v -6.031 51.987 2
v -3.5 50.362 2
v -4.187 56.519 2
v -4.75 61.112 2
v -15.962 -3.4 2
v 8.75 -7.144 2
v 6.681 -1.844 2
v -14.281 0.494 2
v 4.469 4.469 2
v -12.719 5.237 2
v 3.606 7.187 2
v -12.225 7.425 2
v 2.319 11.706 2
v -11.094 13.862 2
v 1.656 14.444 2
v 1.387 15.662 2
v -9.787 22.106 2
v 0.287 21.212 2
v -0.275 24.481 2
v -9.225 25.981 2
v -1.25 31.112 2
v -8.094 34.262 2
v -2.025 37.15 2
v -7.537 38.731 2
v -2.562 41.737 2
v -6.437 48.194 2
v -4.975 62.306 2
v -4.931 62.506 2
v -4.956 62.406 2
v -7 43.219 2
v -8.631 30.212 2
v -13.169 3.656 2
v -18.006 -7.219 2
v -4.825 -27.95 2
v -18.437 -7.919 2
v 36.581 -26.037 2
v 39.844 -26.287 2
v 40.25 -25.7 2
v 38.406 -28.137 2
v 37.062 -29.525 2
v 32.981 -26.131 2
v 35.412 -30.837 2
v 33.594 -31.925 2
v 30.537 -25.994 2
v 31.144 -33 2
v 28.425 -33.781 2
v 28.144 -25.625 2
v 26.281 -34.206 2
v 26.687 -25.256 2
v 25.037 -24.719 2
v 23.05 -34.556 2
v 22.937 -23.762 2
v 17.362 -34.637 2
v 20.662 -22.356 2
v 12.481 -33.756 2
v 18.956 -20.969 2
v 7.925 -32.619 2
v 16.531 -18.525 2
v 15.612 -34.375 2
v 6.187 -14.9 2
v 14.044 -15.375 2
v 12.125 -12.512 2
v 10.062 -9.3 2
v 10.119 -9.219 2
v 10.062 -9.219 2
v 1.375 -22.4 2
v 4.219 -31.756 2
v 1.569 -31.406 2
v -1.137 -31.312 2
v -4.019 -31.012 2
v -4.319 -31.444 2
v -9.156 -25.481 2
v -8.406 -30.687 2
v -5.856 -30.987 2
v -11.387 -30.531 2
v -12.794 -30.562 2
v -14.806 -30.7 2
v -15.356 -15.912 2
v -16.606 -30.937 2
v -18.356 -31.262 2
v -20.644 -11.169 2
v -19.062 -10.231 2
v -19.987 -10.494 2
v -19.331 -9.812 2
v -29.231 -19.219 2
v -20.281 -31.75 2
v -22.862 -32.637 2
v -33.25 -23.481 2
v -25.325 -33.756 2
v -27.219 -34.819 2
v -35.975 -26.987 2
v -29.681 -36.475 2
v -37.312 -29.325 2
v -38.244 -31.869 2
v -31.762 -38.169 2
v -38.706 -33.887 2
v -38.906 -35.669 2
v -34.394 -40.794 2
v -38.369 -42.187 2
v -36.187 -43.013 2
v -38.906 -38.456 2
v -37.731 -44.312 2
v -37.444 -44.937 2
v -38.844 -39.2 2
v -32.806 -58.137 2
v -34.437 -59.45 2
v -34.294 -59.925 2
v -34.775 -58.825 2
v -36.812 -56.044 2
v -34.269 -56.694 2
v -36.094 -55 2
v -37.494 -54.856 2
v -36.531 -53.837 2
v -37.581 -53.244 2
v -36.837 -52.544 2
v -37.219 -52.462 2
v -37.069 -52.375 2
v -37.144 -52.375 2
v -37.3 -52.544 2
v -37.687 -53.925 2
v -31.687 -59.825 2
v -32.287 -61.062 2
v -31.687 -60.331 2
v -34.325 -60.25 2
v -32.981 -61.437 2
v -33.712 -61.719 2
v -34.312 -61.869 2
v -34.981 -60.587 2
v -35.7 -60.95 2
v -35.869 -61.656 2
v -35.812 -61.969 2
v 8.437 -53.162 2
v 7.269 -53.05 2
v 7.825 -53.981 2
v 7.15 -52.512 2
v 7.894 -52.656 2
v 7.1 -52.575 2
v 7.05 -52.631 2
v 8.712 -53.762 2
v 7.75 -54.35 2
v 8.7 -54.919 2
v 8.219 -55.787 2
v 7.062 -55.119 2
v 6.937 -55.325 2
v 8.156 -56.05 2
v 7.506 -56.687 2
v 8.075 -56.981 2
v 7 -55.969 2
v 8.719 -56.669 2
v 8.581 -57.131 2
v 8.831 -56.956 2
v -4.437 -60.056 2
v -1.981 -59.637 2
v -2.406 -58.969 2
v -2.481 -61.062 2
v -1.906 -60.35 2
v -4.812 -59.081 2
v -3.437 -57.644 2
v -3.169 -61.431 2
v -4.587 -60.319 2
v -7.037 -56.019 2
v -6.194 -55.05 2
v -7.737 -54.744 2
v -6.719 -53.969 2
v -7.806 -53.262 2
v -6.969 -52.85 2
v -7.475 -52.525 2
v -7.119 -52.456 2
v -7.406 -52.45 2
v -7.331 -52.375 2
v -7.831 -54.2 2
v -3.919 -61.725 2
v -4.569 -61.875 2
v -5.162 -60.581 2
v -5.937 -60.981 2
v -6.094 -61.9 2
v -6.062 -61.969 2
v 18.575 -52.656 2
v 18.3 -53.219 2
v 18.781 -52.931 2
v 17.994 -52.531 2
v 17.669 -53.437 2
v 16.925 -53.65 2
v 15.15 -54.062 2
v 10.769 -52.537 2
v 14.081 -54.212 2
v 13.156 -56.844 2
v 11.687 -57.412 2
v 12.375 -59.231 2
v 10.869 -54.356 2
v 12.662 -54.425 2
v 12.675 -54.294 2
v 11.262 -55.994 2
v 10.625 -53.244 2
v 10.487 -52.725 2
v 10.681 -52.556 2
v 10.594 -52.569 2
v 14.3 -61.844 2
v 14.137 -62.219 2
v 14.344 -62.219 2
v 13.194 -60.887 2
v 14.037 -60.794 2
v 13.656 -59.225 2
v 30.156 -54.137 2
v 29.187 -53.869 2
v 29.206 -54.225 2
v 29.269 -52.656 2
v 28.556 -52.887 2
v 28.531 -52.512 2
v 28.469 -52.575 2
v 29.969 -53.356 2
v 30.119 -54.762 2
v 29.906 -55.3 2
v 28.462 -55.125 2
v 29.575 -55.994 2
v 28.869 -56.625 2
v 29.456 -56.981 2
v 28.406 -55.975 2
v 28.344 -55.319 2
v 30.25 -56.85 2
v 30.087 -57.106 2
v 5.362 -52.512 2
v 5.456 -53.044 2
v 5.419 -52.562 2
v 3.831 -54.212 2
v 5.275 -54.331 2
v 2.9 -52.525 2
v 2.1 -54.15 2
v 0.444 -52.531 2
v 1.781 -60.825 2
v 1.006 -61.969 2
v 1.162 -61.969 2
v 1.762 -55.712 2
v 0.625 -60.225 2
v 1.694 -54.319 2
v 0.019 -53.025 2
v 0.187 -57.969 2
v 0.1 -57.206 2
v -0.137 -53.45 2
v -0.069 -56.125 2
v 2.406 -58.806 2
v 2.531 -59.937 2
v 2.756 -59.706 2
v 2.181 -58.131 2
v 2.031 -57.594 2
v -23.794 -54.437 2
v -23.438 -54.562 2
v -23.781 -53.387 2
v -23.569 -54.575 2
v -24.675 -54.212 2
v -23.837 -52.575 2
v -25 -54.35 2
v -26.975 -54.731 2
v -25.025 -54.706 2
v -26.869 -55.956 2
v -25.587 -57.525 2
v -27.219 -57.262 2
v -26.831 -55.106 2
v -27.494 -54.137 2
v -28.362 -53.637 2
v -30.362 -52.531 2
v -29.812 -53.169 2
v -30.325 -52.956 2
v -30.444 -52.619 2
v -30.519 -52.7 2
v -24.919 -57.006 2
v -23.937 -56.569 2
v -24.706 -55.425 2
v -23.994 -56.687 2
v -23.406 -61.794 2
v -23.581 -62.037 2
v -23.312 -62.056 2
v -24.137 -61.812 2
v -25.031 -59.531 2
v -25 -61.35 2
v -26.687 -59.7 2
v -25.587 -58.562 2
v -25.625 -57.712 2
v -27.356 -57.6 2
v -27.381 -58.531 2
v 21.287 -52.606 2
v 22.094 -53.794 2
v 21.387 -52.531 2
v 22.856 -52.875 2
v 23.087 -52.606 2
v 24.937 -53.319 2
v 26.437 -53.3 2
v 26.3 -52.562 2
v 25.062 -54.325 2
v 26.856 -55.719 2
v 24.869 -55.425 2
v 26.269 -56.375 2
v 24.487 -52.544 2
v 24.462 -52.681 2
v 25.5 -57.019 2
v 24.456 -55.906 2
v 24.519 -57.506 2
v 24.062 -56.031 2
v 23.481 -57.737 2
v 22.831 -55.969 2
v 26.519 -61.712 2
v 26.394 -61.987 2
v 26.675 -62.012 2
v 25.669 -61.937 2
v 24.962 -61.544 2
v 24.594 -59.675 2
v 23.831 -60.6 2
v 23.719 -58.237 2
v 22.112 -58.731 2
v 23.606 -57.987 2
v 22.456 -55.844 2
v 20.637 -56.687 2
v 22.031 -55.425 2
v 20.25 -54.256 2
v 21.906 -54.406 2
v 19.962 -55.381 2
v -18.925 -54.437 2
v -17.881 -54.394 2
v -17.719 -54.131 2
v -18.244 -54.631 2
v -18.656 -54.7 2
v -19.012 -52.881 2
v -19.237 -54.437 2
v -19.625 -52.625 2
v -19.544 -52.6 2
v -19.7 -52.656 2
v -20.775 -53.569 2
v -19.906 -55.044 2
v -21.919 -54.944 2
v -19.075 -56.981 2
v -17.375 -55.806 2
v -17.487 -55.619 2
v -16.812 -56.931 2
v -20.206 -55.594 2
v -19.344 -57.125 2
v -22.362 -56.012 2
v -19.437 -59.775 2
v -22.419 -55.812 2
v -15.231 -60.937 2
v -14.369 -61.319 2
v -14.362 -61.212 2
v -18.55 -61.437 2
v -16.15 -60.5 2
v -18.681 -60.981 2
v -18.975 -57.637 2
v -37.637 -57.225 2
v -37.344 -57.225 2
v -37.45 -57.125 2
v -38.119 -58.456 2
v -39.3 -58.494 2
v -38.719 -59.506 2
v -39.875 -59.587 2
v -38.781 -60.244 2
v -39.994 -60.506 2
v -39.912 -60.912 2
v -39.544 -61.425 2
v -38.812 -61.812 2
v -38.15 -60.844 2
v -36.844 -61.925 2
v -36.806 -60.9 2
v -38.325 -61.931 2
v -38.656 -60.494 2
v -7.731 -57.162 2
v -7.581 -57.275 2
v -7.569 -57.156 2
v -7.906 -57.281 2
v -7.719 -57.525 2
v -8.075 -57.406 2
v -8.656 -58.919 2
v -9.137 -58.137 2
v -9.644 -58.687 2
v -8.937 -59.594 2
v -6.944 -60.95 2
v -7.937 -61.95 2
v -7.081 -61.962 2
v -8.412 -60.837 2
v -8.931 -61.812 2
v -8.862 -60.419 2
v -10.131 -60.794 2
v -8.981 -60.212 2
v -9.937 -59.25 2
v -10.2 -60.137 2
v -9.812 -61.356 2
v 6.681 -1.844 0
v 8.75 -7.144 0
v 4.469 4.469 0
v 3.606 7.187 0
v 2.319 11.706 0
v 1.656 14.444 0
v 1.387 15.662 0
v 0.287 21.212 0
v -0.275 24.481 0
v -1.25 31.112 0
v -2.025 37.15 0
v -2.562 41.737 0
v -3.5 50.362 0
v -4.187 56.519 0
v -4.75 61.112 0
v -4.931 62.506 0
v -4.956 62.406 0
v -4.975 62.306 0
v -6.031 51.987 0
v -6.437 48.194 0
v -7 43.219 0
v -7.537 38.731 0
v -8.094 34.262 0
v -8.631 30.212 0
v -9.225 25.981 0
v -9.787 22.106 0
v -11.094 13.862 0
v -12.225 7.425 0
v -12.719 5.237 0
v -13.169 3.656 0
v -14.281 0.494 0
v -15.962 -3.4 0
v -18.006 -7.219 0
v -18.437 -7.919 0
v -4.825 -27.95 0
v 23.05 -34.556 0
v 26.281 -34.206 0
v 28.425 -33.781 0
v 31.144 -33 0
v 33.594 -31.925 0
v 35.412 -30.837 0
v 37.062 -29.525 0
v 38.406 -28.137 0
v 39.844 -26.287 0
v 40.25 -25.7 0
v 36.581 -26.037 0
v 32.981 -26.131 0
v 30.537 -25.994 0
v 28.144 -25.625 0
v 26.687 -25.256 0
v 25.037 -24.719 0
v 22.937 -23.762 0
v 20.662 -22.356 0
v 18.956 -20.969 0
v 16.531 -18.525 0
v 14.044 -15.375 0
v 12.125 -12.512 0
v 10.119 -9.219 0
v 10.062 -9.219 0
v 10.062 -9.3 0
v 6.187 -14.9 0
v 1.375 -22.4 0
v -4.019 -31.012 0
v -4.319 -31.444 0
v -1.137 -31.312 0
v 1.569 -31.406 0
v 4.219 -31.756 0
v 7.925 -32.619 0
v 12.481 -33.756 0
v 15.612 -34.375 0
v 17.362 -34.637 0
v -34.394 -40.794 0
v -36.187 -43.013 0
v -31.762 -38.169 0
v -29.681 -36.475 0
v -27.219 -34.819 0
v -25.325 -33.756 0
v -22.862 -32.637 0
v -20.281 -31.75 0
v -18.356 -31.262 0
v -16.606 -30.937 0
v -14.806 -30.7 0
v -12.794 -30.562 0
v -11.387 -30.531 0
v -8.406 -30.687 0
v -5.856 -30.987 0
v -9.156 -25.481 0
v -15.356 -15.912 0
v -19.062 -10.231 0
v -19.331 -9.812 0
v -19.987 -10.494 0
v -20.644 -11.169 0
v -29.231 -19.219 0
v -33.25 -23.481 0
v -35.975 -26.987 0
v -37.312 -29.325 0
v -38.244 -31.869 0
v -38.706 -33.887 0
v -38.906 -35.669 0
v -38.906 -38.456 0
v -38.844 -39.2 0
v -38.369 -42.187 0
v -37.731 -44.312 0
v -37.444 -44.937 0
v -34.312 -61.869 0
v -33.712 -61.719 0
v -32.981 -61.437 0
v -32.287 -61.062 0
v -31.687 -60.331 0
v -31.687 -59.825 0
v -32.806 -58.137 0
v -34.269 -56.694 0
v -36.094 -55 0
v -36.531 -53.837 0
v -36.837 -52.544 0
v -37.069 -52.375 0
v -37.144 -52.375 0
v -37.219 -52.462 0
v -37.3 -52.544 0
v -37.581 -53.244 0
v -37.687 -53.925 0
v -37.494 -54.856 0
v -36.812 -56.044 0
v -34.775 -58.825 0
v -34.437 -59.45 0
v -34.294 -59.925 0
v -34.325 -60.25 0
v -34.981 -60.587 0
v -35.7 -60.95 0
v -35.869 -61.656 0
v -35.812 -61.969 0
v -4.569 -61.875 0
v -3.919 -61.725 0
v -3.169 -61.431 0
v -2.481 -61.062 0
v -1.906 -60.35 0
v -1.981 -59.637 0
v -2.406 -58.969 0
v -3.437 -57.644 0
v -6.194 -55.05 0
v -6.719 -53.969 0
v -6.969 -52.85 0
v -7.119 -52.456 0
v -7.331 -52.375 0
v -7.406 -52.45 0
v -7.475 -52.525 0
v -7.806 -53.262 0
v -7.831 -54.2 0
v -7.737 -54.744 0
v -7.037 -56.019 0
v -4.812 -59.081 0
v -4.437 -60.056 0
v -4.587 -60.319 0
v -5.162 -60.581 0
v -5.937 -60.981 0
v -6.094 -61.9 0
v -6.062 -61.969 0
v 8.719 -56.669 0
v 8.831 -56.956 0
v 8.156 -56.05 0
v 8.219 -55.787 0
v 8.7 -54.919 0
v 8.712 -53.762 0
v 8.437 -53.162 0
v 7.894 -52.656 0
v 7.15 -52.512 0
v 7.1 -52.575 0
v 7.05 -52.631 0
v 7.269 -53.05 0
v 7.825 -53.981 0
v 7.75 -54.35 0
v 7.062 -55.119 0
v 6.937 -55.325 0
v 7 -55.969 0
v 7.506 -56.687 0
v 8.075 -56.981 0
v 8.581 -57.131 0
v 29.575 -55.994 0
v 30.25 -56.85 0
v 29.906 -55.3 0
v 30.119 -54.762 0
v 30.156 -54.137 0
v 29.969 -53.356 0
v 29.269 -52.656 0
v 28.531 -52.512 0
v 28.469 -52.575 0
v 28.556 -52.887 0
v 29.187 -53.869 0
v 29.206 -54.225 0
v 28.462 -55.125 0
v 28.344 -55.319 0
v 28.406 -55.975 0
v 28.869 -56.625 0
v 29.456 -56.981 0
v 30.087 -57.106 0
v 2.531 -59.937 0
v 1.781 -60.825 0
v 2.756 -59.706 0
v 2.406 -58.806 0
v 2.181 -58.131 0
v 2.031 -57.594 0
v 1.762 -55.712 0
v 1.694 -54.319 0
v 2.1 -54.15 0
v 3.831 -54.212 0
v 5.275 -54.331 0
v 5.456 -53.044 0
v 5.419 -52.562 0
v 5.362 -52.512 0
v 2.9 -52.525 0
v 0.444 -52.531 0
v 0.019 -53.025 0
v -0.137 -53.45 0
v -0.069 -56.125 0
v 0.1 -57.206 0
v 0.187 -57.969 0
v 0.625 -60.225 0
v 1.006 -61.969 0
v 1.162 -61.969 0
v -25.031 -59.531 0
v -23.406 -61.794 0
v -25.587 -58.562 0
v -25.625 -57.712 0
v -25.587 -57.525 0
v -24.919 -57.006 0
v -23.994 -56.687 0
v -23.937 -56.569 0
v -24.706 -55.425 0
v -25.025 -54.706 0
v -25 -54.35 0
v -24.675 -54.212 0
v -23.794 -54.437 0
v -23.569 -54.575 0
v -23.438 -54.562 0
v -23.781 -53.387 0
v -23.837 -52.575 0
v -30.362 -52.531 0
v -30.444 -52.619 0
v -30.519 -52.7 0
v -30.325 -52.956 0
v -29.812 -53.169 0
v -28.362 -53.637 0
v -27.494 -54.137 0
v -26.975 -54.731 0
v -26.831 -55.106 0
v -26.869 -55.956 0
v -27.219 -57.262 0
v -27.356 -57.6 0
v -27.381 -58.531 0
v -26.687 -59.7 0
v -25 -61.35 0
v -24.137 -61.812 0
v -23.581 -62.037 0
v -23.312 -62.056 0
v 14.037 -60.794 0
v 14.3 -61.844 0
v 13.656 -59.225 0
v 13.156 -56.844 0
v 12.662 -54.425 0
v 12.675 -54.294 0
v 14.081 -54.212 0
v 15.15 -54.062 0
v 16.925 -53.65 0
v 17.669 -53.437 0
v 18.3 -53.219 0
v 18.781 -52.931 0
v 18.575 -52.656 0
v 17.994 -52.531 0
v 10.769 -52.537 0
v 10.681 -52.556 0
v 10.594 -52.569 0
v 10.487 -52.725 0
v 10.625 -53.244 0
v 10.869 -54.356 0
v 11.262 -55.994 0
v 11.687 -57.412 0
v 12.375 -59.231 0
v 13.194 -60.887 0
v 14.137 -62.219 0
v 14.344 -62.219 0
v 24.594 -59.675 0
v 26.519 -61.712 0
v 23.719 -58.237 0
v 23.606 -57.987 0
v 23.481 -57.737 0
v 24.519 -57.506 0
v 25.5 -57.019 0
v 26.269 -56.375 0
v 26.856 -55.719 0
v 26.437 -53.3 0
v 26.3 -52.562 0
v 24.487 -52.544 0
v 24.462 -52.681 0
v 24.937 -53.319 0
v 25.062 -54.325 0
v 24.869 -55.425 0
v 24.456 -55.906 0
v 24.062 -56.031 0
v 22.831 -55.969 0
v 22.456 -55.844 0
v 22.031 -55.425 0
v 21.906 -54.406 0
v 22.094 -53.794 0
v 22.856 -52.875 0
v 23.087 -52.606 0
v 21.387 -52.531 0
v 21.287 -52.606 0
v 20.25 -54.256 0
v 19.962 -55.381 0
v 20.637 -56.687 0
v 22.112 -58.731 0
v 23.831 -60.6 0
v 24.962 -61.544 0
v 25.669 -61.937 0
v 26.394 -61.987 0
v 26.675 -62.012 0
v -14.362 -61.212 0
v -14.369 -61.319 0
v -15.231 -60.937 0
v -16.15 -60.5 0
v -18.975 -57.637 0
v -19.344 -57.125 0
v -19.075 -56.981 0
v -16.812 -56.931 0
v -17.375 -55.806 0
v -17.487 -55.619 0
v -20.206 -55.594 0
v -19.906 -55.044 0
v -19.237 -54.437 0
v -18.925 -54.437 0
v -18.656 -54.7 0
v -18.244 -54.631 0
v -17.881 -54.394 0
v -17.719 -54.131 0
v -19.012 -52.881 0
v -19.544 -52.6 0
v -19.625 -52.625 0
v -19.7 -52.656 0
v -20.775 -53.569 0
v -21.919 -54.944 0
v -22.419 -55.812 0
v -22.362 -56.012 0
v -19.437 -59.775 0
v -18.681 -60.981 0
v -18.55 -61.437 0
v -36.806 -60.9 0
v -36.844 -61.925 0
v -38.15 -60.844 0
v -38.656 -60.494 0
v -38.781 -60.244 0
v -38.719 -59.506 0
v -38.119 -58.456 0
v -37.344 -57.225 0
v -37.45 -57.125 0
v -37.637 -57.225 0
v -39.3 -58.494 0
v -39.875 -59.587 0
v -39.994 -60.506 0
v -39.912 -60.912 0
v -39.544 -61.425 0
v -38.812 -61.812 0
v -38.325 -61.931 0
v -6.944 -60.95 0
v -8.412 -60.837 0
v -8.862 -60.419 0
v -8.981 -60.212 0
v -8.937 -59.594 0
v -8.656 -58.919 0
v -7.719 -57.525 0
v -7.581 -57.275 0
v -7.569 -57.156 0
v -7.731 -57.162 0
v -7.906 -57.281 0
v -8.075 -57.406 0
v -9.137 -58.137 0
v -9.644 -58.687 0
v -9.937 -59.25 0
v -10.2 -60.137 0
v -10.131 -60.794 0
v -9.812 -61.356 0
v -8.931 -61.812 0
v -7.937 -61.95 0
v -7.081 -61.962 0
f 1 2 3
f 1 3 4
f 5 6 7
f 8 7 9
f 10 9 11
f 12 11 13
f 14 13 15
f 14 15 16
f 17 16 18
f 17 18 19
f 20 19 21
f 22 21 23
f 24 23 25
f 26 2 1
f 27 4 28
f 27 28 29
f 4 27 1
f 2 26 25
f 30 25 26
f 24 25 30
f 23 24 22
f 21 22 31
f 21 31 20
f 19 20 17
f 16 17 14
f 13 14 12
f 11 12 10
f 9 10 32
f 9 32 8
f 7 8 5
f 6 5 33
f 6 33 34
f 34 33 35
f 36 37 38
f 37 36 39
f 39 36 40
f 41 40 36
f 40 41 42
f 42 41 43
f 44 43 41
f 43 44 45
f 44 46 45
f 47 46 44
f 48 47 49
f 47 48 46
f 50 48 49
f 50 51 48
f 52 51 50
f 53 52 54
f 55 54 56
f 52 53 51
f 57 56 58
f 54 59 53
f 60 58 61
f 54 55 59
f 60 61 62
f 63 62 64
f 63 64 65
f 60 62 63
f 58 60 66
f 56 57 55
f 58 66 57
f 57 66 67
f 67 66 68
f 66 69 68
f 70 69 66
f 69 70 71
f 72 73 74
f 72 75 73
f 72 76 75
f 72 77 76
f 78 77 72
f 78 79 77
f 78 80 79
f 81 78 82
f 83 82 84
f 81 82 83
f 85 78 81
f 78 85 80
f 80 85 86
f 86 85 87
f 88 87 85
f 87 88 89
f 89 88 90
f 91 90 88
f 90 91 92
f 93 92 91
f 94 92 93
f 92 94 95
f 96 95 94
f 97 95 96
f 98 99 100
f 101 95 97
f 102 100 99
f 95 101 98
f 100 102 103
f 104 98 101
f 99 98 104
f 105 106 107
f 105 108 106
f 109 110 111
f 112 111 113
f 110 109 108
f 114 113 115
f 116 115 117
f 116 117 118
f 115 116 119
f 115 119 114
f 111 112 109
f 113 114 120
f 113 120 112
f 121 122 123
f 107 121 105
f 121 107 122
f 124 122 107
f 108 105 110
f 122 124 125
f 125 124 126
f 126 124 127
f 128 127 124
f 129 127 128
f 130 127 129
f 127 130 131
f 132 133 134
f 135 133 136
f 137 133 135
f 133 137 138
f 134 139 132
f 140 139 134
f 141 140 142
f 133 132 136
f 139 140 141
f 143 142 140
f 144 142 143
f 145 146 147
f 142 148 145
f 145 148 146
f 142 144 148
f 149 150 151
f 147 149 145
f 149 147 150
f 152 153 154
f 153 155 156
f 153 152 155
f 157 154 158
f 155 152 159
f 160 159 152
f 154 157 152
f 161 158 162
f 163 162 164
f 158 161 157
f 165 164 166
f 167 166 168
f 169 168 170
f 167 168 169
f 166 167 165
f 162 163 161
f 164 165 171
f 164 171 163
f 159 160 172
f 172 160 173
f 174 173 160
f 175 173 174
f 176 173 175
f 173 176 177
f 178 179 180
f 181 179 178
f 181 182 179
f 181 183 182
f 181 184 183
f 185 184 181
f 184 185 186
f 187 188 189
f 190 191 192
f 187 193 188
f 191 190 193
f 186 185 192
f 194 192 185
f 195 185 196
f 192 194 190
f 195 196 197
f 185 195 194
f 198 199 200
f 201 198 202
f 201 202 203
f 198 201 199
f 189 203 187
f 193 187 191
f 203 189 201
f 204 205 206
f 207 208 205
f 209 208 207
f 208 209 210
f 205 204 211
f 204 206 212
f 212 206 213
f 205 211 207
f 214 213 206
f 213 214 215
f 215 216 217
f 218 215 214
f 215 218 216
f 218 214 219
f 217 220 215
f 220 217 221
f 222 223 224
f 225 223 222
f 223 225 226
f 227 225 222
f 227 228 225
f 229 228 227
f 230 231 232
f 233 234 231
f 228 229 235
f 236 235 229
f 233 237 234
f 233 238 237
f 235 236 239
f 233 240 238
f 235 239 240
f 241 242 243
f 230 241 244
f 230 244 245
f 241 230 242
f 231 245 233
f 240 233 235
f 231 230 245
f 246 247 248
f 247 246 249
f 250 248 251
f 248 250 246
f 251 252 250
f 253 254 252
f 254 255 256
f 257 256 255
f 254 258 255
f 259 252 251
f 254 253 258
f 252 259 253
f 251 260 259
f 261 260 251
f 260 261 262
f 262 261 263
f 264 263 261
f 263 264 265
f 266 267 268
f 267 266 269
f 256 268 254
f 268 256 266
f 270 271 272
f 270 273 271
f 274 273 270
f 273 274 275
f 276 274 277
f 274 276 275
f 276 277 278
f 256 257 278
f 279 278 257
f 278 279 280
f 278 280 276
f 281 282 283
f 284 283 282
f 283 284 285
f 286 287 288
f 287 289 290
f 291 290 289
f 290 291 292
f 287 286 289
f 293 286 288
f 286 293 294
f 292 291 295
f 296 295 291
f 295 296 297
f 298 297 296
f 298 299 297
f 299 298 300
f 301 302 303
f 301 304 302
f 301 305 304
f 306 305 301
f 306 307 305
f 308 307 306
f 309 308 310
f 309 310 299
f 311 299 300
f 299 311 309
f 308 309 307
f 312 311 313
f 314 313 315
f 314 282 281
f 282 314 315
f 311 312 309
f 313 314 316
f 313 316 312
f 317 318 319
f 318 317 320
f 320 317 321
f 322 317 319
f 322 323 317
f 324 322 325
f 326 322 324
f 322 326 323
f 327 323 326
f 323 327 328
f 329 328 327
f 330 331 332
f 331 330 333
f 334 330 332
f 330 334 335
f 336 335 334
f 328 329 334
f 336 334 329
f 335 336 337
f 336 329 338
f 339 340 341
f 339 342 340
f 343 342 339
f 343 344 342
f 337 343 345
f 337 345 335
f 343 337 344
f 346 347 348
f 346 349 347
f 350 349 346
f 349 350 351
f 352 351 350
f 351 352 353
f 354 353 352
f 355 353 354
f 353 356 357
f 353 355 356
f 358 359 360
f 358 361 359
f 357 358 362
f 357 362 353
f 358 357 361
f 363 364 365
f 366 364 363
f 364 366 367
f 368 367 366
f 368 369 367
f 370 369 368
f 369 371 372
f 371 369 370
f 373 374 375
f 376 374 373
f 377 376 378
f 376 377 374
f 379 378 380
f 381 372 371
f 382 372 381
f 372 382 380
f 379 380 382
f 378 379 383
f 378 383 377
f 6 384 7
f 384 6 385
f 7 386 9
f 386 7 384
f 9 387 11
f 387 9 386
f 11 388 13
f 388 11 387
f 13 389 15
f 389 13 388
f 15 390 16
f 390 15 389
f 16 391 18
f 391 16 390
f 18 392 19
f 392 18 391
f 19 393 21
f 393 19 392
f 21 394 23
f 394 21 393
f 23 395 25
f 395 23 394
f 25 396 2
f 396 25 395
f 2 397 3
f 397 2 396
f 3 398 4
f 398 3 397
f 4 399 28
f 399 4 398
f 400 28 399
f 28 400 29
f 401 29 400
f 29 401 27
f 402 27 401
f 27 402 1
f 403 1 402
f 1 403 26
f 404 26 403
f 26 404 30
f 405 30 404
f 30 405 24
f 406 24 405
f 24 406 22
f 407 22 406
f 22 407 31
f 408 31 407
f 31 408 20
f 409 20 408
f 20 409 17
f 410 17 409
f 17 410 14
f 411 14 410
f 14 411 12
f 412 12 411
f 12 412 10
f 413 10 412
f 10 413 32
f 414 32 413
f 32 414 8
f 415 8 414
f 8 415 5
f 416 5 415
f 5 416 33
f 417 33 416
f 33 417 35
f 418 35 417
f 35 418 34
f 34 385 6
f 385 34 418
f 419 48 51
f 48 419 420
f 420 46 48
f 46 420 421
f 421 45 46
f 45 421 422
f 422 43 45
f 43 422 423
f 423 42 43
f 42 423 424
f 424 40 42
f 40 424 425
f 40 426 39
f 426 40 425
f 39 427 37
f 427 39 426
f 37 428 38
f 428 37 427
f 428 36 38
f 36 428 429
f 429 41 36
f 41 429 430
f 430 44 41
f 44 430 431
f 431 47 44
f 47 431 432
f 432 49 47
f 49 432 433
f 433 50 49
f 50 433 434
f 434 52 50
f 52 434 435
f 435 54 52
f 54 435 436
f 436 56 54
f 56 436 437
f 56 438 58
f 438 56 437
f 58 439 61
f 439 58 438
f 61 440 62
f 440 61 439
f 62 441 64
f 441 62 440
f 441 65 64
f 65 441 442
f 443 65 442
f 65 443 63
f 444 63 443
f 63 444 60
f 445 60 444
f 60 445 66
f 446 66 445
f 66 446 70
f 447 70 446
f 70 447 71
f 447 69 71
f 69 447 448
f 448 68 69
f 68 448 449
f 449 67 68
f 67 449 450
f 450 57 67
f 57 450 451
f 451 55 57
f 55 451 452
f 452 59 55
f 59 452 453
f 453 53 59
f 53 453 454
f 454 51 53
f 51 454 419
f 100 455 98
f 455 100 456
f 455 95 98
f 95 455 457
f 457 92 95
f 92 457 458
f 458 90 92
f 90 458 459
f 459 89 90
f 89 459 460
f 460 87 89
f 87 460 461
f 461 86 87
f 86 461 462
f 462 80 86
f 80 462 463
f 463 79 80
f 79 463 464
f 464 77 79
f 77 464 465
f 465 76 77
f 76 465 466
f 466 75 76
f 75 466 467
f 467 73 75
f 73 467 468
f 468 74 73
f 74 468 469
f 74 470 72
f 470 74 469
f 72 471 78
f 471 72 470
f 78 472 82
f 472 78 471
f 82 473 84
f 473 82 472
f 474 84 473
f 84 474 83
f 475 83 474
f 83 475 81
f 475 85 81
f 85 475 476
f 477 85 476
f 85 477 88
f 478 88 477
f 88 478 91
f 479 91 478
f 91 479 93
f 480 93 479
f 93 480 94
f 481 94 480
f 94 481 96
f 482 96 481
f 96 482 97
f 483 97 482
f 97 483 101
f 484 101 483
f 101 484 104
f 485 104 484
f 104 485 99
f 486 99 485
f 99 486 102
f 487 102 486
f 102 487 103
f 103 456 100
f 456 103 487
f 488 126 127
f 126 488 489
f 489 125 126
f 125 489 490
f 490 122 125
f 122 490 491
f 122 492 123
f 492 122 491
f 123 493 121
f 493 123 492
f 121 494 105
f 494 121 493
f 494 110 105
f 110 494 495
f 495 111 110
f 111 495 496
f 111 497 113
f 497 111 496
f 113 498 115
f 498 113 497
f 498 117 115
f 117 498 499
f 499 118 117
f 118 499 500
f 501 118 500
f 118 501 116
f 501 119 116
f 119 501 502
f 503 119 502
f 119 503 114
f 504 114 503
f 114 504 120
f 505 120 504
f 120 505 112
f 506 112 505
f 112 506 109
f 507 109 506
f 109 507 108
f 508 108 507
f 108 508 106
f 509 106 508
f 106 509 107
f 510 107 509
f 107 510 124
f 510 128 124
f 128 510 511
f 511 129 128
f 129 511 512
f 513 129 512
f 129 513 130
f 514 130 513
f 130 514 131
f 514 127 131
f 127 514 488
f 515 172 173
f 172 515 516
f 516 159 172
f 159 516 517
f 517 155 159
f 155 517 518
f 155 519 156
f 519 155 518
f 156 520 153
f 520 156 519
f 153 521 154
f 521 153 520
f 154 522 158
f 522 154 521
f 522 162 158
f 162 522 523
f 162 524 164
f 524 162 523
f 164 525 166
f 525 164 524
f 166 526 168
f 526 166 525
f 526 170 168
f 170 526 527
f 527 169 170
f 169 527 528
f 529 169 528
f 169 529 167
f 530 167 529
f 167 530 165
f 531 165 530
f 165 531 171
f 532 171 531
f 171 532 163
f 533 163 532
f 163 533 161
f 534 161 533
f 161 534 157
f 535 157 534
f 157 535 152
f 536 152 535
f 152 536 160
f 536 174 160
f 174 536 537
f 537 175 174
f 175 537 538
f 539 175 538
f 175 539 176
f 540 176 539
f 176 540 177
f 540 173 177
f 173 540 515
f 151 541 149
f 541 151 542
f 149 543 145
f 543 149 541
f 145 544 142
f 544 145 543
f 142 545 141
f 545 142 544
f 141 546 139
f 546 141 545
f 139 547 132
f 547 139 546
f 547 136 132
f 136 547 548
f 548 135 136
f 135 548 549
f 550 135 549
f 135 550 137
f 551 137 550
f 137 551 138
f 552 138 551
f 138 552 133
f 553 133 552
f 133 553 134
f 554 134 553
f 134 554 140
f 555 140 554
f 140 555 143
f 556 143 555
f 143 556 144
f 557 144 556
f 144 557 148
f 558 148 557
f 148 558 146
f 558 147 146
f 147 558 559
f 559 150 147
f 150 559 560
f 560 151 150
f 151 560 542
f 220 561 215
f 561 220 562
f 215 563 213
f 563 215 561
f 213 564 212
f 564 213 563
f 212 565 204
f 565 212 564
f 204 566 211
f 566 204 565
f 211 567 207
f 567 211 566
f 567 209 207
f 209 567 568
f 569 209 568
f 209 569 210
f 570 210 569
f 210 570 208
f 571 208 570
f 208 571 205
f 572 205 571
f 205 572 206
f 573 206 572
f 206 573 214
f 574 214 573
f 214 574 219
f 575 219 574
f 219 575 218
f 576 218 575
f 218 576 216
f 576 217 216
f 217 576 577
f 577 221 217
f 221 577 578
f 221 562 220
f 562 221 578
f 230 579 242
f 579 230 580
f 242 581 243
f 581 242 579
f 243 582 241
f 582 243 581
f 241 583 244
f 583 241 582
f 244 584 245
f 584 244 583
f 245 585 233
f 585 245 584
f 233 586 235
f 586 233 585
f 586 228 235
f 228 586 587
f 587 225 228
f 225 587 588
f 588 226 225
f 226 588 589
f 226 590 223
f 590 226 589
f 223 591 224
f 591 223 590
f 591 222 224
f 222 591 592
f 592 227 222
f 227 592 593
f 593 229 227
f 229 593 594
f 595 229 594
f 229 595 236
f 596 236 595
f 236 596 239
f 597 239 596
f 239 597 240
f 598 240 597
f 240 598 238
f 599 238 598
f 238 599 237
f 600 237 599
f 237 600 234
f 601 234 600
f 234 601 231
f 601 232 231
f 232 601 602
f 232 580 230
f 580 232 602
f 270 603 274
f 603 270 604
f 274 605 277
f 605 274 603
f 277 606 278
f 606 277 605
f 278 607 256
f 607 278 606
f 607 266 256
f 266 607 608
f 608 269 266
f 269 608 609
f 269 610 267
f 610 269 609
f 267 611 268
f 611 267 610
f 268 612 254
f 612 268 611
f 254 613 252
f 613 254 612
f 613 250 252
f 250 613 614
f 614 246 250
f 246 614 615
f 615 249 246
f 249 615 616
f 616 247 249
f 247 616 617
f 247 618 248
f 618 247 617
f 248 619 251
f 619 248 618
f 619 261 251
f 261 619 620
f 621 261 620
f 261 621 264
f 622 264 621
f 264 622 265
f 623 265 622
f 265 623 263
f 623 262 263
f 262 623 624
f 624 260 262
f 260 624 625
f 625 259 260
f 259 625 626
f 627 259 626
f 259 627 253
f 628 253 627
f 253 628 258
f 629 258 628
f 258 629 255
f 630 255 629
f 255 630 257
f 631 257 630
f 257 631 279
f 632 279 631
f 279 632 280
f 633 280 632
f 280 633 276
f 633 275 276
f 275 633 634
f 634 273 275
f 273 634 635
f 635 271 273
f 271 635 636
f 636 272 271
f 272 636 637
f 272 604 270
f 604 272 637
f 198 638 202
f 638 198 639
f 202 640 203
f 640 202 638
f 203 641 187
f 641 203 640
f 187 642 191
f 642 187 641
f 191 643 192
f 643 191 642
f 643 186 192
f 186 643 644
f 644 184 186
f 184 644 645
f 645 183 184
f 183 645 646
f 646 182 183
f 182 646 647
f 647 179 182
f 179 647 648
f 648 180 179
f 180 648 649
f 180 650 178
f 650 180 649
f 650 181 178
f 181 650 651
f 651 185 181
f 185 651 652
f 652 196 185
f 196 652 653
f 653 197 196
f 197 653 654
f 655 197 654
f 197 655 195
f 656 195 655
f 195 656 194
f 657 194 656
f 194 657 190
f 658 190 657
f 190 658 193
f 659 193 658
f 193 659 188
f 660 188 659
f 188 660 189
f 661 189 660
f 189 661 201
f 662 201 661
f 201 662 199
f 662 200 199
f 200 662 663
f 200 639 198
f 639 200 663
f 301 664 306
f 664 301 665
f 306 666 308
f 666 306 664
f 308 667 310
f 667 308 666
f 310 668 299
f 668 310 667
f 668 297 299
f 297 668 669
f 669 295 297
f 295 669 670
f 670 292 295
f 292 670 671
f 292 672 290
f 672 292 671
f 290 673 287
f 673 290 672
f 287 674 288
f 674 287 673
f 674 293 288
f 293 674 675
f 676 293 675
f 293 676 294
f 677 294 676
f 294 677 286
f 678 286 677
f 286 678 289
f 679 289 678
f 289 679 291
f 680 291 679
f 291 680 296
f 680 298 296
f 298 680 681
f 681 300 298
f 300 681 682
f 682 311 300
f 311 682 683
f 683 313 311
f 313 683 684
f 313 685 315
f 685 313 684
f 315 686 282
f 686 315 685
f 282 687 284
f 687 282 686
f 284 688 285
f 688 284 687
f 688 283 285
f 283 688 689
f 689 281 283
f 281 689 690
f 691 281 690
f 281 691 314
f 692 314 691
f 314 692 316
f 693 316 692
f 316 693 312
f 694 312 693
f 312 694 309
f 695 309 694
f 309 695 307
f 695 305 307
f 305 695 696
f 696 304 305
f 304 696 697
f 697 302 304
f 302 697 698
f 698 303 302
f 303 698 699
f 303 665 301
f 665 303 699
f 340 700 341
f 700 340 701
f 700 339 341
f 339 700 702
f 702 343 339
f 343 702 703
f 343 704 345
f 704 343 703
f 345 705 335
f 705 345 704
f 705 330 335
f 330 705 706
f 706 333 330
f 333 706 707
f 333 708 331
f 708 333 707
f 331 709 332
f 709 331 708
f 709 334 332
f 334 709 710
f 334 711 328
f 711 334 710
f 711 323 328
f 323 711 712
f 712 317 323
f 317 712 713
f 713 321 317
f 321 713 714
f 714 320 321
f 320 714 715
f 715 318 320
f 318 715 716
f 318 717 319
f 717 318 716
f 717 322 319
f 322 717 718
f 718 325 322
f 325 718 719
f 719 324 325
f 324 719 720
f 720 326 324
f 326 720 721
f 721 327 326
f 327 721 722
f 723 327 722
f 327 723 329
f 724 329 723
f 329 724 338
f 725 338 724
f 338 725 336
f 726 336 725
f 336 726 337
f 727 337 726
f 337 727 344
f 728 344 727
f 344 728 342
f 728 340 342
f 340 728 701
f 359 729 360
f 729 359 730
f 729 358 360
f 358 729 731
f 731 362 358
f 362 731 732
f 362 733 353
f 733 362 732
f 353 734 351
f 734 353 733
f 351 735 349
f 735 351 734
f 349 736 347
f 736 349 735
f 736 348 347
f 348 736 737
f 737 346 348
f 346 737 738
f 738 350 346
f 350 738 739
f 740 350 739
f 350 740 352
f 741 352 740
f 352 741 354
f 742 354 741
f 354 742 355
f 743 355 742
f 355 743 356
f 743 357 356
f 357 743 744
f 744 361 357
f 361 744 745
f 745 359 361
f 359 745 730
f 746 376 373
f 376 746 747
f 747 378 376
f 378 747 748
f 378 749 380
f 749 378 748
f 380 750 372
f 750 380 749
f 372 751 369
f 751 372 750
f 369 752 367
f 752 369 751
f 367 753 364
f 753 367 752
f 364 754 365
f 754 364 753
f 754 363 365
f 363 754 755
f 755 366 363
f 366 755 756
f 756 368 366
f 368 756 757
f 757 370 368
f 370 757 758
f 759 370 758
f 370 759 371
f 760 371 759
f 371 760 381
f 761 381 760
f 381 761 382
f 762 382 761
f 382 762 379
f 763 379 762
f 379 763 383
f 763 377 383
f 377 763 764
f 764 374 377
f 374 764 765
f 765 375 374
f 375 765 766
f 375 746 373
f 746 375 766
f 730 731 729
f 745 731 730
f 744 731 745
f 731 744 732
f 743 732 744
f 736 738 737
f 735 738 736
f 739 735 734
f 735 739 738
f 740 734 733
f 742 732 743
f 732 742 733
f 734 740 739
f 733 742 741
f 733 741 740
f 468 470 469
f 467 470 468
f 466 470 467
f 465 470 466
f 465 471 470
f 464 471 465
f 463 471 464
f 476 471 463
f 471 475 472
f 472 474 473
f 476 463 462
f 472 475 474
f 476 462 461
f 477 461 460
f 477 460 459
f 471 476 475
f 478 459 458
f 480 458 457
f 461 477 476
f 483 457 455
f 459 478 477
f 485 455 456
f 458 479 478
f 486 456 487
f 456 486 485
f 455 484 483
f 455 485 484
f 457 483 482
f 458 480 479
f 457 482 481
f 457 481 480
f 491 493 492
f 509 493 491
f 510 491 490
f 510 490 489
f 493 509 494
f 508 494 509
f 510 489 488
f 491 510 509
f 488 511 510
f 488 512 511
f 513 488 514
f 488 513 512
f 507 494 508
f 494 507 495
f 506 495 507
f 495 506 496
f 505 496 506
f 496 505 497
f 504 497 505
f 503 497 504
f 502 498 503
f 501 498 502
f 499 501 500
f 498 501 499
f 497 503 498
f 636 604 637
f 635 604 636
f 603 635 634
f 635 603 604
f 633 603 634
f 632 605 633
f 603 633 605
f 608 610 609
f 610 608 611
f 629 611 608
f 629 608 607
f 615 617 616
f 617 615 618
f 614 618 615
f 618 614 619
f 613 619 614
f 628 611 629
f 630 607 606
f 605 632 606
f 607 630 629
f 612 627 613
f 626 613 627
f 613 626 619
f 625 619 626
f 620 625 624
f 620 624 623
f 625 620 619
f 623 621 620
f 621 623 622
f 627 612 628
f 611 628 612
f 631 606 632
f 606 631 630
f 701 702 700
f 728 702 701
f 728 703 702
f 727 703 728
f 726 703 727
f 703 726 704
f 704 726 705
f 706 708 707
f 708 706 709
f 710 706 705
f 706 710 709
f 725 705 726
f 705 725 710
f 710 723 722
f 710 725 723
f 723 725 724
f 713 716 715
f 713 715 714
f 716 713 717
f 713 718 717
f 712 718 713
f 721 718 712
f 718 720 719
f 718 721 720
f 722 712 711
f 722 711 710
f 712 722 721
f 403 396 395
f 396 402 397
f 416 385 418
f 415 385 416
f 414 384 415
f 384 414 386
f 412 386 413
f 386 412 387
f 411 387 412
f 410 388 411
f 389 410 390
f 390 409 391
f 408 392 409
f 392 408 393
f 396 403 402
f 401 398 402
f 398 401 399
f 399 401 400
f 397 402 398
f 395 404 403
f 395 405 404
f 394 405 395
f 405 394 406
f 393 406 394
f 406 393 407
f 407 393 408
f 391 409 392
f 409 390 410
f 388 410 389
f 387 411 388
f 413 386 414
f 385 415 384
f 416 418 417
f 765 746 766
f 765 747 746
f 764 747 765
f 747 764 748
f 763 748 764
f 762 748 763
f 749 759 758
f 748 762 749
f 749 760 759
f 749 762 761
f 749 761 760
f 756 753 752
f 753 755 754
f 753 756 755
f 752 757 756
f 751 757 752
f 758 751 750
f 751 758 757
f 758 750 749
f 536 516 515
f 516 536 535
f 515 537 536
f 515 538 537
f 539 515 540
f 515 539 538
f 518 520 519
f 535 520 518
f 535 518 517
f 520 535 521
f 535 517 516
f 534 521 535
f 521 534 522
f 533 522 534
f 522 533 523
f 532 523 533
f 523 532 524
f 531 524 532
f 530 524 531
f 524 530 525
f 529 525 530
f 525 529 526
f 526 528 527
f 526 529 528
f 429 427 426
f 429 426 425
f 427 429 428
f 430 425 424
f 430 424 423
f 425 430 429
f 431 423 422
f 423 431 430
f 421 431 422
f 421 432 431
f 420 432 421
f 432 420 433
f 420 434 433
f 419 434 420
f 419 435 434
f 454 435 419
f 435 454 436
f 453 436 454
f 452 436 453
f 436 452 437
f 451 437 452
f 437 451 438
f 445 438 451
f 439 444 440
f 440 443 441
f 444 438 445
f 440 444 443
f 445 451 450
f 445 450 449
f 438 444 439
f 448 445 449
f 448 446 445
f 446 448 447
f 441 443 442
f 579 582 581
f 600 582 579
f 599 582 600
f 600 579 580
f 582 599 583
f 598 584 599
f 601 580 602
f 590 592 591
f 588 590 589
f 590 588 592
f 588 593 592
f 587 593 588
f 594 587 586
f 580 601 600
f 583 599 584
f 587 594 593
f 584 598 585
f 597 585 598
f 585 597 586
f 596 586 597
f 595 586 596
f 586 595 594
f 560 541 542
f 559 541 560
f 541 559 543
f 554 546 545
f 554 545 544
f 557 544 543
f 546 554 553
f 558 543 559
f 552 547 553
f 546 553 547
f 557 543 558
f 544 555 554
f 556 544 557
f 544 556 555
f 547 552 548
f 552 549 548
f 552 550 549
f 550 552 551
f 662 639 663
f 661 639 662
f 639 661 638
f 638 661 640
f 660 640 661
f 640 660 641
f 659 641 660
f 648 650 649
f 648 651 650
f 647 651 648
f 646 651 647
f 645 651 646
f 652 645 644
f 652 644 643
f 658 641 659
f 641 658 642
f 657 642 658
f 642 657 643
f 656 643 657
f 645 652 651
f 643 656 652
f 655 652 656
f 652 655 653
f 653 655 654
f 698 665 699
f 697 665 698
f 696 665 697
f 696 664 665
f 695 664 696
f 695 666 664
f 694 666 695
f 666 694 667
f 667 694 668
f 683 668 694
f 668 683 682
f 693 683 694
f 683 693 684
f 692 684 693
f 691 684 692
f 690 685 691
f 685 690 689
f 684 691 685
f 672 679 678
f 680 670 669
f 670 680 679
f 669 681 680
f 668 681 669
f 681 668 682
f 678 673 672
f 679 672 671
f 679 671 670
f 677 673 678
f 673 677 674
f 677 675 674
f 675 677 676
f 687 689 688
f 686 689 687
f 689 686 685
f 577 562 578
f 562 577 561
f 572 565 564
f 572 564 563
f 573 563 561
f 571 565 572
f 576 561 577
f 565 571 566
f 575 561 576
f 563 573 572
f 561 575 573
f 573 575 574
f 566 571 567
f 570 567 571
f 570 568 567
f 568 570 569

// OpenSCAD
module 74d9130690c415567329cd0a4fc02403_1()
{
 /* Generated by trace2scad version 20150415
    http://aggregate.org/MAKE/TRACE2SCAD/
    Optimized model has 387/4796 original points
 */
 color([0.48, 0.48, 0.48])
 assign(minx=0) /* polygon minx=39 */
 assign(miny=0) /* polygon miny=45 */
 assign(maxx=12880) /* polygon maxx=12880 */
 assign(maxy=20000) /* polygon maxy=20001 */
 assign(dx=maxx-minx)
 assign(dy=maxy-miny)
 assign(maxd=((dx>dy)?dx:dy))
 scale([1/maxd, 1/maxd, 1])
 translate([-minx-dx/2, -miny-dy/2, 0])
 linear_extrude(height=1, convexity=387)
 union() {
  union() {
   polygon([[5647,19985],[5644,19969],[5475,18318],[5410,17711],[5320,16915],[5234,16197],[5145,15482],[5059,14834],[4964,14157],[4874,13537],[4665,12218],[4484,11188],[4405,10838],[4333,10585],[4155,10079],[3886,9456],[3559,8845],[3490,8733],[5668,5528],[7840,8857],[7509,9705],[7155,10715],[7017,11150],[6811,11873],[6705,12311],[6662,12506],[6486,13394],[6396,13917],[6240,14978],[6116,15944],[6030,16678],[5880,18058],[5770,19043],[5680,19778],[5651,20001]], convexity=6);
   polygon([[8050,8518],[8050,8512],[7430,7616],[6660,6416],[5797,5038],[5749,4969],[6258,4990],[6691,4975],[7115,4919],[7708,4781],[8437,4599],[8938,4500],[9218,4458],[10128,4471],[10645,4527],[10988,4595],[11423,4720],[11815,4892],[12106,5066],[12370,5276],[12585,5498],[12815,5794],[12880,5888],[12293,5834],[11717,5819],[11326,5841],[10943,5900],[10710,5959],[10446,6045],[10110,6198],[9746,6423],[9473,6645],[9085,7036],[8687,7540],[8380,7998],[8059,8525],[8050,8525]], convexity=9);
   polygon([[3242,8321],[3137,8213],[1763,6925],[1120,6243],[684,5682],[470,5308],[321,4901],[247,4578],[215,4293],[215,3847],[225,3728],[301,3250],[403,2910],[449,2810],[650,3118],[937,3473],[1358,3893],[1691,4164],[2085,4429],[2388,4599],[2782,4778],[3195,4920],[3503,4998],[3783,5050],[4071,5088],[4393,5110],[4618,5115],[5095,5090],[5503,5042],[4975,5923],[3983,7454],[3390,8363],[3347,8430]], convexity=7);
   polygon([[485,1606],[472,1593],[427,1481],[410,1372],[441,1223],[550,1033],[876,588],[930,488],[953,412],[948,360],[843,306],[728,248],[701,135],[710,85],[950,101],[1046,125],[1163,170],[1274,230],[1370,347],[1370,428],[1191,698],[957,929],[665,1200],[595,1386],[546,1593],[509,1620],[497,1620]], convexity=8);
   polygon([[5255,1608],[5244,1596],[5191,1478],[5187,1328],[5202,1241],[5314,1037],[5670,547],[5730,391],[5706,349],[5614,307],[5490,243],[5465,96],[5470,85],[5709,100],[5813,124],[5933,171],[6043,230],[6135,344],[6123,458],[6055,565],[5890,777],[5449,1192],[5365,1365],[5325,1544],[5301,1607],[5267,1620]], convexity=8);
   polygon([[6904,1596],[6511,1595],[6443,1516],[6418,1448],[6429,1020],[6456,847],[6470,725],[6540,364],[6601,85],[6626,85],[6725,268],[6845,410],[6881,447],[6825,591],[6789,699],[6765,785],[6722,1086],[6711,1309],[6776,1336],[7053,1326],[7284,1307],[7313,1513],[7307,1590],[7298,1598]], convexity=10);
   polygon([[7576,1588],[7568,1579],[7603,1512],[7692,1363],[7680,1304],[7570,1181],[7550,1148],[7560,1045],[7641,930],[7732,883],[7813,859],[7853,887],[7835,933],[7745,1032],[7755,1074],[7832,1213],[7834,1398],[7790,1494],[7703,1575],[7584,1598]], convexity=10);
   polygon([[11000,1593],[10995,1588],[11009,1538],[11110,1381],[11113,1324],[10994,1180],[10975,1149],[10985,1044],[11059,940],[11153,883],[11254,863],[11280,904],[11172,1041],[11225,1152],[11259,1238],[11265,1338],[11235,1463],[11123,1575],[11005,1598]], convexity=10);
   polygon([[1569,1581],[1557,1568],[1588,1527],[1670,1493],[1902,1418],[2041,1338],[2124,1243],[2147,1183],[2141,1047],[2085,838],[2063,784],[2059,635],[2170,448],[2440,184],[2578,110],[2667,74],[2710,71],[2695,113],[2435,475],[2346,630],[2340,766],[2346,796],[2453,879],[2601,930],[2610,949],[2487,1132],[2436,1247],[2440,1304],[2492,1326],[2633,1290],[2669,1268],[2690,1270],[2635,1458],[2626,1588],[1582,1595]], convexity=13);
   polygon([[8149,1591],[8135,1589],[8118,1564],[8140,1481],[8179,1303],[8242,1041],[8310,814],[8420,523],[8551,258],[8702,45],[8735,45],[8728,105],[8686,273],[8625,524],[8545,905],[8466,1292],[8468,1313],[8693,1326],[8864,1350],[9148,1416],[9267,1450],[9368,1485],[9445,1531],[9412,1575],[9319,1595],[8163,1594]], convexity=9);
   polygon([[9854,1589],[9846,1583],[9680,1319],[9634,1139],[9742,930],[9978,603],[10253,304],[10434,153],[10547,90],[10663,82],[10708,78],[10683,126],[10375,452],[10235,682],[10217,722],[10197,762],[10363,799],[10520,877],[10643,980],[10737,1085],[10670,1472],[10648,1590],[10358,1593],[10354,1571],[10430,1469],[10450,1308],[10419,1132],[10353,1055],[10290,1035],[10093,1045],[10033,1065],[9965,1132],[9945,1295],[9975,1393],[10097,1540],[10134,1583],[9862,1595]], convexity=13);
   polygon([[3300,1580],[3288,1575],[3116,1429],[2933,1209],[2853,1070],[2862,1038],[3330,436],[3451,243],[3472,170],[4141,189],[4142,206],[4003,250],[3856,320],[3404,778],[3345,860],[3388,883],[3750,891],[3660,1071],[3642,1101],[3207,1105],[3255,1193],[3362,1290],[3412,1290],[3455,1248],[3521,1259],[3579,1297],[3605,1339],[3398,1539],[3313,1584]], convexity=12);
   polygon([[433,852],[418,844],[152,641],[60,466],[41,319],[54,254],[113,172],[230,110],[308,91],[545,92],[551,256],[336,265],[255,321],[235,361],[245,479],[341,647],[465,844],[448,860]], convexity=8);
   polygon([[5175,835],[5148,815],[4978,698],[4897,610],[4850,520],[4808,378],[4819,273],[4870,183],[5011,110],[5170,88],[5307,86],[5329,248],[5094,266],[5022,333],[5003,366],[5010,465],[5055,573],[5205,796],[5227,836],[5229,855],[5203,854]], convexity=8);
  }
 }
}

module 74d9130690c415567329cd0a4fc02403()
{
 /* all layers combined, scaled to within a 1mm cube */
 scale([1, 1, 1/1])
 difference() {
  union() {
   scale([1,1,2]) translate([0,0,-0.5]) 74d9130690c415567329cd0a4fc02403_1();
  }
  translate([0,0,-2]) cube([2,2,4],center=true);
 }
}

scale([125, 125, 2]) {
	74d9130690c415567329cd0a4fc02403();
}
